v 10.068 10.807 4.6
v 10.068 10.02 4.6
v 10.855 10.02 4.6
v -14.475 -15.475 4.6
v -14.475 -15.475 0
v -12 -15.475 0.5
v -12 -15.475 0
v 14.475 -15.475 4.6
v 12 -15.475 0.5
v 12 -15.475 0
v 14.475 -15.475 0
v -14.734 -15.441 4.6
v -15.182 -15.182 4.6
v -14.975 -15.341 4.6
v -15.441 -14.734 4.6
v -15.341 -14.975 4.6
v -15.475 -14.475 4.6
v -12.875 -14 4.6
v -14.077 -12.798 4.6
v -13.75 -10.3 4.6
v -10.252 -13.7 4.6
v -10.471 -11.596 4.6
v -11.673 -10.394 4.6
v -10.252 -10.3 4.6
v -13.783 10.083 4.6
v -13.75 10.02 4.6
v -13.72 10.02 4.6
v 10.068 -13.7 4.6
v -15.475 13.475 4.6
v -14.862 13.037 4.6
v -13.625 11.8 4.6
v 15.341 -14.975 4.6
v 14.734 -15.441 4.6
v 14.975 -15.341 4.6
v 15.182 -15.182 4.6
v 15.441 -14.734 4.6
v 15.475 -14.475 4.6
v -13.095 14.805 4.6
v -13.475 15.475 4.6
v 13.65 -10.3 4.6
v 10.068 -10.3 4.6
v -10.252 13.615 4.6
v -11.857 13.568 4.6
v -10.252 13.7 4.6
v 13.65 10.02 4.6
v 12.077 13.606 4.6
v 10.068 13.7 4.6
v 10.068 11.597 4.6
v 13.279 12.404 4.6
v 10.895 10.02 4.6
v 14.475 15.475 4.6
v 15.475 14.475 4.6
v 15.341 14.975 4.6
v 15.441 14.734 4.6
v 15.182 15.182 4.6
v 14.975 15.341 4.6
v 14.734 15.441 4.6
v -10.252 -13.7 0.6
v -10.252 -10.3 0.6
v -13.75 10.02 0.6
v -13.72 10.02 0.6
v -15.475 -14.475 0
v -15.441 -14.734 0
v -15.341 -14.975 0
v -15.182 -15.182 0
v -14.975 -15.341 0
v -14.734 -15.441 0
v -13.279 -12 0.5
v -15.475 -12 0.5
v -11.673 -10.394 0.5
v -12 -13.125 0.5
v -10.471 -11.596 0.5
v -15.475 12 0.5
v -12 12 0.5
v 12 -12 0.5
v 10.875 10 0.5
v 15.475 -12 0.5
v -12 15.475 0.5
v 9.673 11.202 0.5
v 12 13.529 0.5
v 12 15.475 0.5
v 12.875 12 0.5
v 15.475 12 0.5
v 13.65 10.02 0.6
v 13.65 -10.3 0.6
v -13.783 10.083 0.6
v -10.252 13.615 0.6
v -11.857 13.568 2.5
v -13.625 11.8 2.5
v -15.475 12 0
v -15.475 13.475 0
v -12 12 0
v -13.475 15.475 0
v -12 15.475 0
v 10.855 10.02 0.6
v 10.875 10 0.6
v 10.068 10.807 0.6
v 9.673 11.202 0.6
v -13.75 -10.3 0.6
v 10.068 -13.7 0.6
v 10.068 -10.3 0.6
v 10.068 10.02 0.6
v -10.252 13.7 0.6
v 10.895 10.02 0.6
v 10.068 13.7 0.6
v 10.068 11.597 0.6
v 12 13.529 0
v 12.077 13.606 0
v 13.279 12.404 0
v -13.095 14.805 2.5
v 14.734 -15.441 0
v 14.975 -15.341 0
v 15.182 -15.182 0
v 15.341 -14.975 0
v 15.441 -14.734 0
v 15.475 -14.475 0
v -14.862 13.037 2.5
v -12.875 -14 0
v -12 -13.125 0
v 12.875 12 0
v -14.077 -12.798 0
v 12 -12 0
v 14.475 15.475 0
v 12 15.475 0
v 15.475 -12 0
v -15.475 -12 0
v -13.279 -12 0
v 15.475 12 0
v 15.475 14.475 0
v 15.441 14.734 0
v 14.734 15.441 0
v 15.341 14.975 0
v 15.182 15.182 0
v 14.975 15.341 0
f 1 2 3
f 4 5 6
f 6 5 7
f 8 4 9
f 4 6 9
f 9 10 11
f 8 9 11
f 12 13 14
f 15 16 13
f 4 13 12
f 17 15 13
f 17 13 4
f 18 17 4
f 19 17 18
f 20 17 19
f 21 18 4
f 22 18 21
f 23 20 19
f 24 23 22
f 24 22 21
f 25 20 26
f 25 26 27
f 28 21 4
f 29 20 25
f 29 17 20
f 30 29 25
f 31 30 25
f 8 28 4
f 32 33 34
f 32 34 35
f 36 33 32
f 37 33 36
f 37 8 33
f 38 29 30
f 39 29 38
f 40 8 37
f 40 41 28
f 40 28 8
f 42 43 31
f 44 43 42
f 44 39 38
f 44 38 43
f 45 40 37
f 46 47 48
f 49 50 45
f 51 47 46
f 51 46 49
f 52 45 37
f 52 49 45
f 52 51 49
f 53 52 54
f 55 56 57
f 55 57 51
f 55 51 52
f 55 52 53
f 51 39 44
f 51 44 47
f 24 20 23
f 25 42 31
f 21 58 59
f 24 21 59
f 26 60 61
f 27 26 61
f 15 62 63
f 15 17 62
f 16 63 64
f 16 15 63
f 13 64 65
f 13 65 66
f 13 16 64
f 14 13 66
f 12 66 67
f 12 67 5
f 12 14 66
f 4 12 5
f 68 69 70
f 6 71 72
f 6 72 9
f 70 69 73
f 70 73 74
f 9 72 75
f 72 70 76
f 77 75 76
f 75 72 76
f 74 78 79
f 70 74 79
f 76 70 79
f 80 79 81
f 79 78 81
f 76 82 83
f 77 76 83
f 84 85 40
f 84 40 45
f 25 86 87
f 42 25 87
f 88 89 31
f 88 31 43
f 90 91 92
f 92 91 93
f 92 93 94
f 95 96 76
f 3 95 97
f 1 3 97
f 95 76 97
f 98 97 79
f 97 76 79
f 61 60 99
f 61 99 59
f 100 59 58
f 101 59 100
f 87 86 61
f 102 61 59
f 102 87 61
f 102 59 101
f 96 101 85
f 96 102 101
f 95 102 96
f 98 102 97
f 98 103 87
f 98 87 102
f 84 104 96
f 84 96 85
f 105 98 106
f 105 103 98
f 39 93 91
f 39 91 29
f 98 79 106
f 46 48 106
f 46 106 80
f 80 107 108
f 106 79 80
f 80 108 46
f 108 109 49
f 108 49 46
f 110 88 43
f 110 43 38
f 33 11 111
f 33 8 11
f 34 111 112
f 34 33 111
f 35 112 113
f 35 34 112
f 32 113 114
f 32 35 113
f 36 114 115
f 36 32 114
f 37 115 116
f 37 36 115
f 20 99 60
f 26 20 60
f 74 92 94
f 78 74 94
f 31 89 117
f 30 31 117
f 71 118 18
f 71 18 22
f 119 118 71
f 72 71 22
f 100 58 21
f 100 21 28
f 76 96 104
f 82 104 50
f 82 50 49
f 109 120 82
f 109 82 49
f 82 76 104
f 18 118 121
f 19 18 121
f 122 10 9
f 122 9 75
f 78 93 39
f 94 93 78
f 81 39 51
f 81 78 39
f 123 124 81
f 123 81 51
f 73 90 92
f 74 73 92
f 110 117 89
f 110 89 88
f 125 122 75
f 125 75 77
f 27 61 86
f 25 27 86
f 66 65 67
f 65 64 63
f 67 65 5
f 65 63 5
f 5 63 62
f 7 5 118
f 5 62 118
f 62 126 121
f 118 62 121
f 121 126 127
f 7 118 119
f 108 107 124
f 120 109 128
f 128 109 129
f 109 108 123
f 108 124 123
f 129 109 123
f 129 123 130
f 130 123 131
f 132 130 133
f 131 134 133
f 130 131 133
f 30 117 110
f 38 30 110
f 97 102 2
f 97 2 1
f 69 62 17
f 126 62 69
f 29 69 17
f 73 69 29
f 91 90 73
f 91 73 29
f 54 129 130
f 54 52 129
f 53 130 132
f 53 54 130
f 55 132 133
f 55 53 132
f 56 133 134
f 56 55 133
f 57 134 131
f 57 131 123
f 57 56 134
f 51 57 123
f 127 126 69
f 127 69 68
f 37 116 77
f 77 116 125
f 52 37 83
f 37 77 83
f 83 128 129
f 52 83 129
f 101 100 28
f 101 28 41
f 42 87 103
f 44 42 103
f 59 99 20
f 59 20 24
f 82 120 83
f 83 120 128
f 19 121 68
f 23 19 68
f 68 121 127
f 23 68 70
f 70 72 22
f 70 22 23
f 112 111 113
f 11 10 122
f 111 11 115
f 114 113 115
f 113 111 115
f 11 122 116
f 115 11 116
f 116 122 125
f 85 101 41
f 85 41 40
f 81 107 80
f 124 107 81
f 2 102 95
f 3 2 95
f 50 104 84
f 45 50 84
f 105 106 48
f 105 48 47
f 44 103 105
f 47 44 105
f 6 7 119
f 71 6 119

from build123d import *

# Parameters (mm, degrees)
BOX_W        = 30.95
BOX_H        = 30.95
BOX_DEPTH    = 4.6
BOX001_W     = 30.975
BOX001_H     = 24
BOX001_DEPTH = 0.5
BOX002_W     = 24
BOX002_H     = 30.975
BOX002_DEPTH = 0.5
BOX003_W     = 20.32
BOX003_H     = 27.4
BOX003_DEPTH = 4
CHAMFER_SIZE = 2
BOX004_W     = 2.5
BOX004_H     = 1.75
BOX004_DEPTH = 3
BOX005_W     = 27.4
BOX005_H     = 20.32
BOX005_DEPTH = 4
BOX006_W     = 5.1
BOX006_H     = 3.3
BOX006_DEPTH = 4
BOX007_W     = 3.4
BOX007_H     = 1.7
BOX007_DEPTH = 4.6
BOX008_W     = 3.4
BOX008_H     = 1.7
BOX008_DEPTH = 4.6
FILLET_R     = 1
FILLET001_R  = 1
FILLET002_R  = 1


with BuildPart() as part:
    # Box → Box (join)
    with BuildSketch(Plane(origin=(-15.475, -15.475, 0), x_dir=(1, 0, 0), z_dir=(0, 0, 1))):
        with Locations((15.475, 15.475)):
            Rectangle(BOX_W, BOX_H)
    extrude(amount=BOX_DEPTH)

    # Box001 → Box001 (cut)
    with BuildSketch(Plane(origin=(-15.475, -12, 0), x_dir=(1, 0, 0), z_dir=(0, 0, 1))):
        with Locations((15.4875, 12)):
            Rectangle(BOX001_W, BOX001_H)
    extrude(amount=BOX001_DEPTH, mode=Mode.SUBTRACT)

    # Box002 → Box002 (cut)
    with BuildSketch(Plane(origin=(-12, -15.475, 0), x_dir=(1, 0, 0), z_dir=(0, 0, 1))):
        with Locations((12, 15.4875)):
            Rectangle(BOX002_W, BOX002_H)
    extrude(amount=BOX002_DEPTH, mode=Mode.SUBTRACT)

    # Box003 → Box003 (cut)
    with BuildSketch(Plane(origin=(-10.252, -13.7, 0.6), x_dir=(1, 0, 0), z_dir=(0, 0, 1))):
        with Locations((10.16, 13.7)):
            Rectangle(BOX003_W, BOX003_H)
    extrude(amount=BOX003_DEPTH, mode=Mode.SUBTRACT)

    # Chamfer
    chamfer_edges = [part.edges().sort_by_distance(p)[0] for p in [
        (-15.475, 15.475, 2.3),
    ]]
    chamfer(chamfer_edges, length=CHAMFER_SIZE)

    # Box004 → Box004 (cut)
    with BuildSketch(Plane(origin=(-13.625, 11.8, 2.5), x_dir=(0.707107, 0.707107, 0), z_dir=(0, 0, 1))):
        with Locations((1.25, 0.875)):
            Rectangle(BOX004_W, BOX004_H)
    extrude(amount=BOX004_DEPTH, mode=Mode.SUBTRACT)

    # Box005 → Box005 (cut)
    with BuildSketch(Plane(origin=(-13.75, -10.3, 0.6), x_dir=(1, 0, 0), z_dir=(0, 0, 1))):
        with Locations((13.7, 10.16)):
            Rectangle(BOX005_W, BOX005_H)
    extrude(amount=BOX005_DEPTH, mode=Mode.SUBTRACT)

    # Box006 → Box006 (cut)
    with BuildSketch(Plane(origin=(-11.45, 7.75, 0.6), x_dir=(0.707107, 0.707107, 0), z_dir=(0, 0, 1))):
        with Locations((2.55, 1.65)):
            Rectangle(BOX006_W, BOX006_H)
    extrude(amount=BOX006_DEPTH, mode=Mode.SUBTRACT)

    # Box007 → Box007 (cut)
    with BuildSketch(Plane(origin=(-12.875, -14, 0), x_dir=(0.707107, 0.707107, 0), z_dir=(0, 0, 1))):
        with Locations((1.7, 0.85)):
            Rectangle(BOX007_W, BOX007_H)
    extrude(amount=BOX007_DEPTH, mode=Mode.SUBTRACT)

    # Box008 → Box008 (cut)
    with BuildSketch(Plane(origin=(10.875, 10, 0), x_dir=(0.707107, 0.707107, 0), z_dir=(0, 0, 1))):
        with Locations((1.7, 0.85)):
            Rectangle(BOX008_W, BOX008_H)
    extrude(amount=BOX008_DEPTH, mode=Mode.SUBTRACT)

    # Fillet
    fillet_edges = [part.edges().sort_by_distance(p)[0] for p in [
        (-15.475, -15.475, 2.3),
    ]]
    fillet(fillet_edges, radius=FILLET_R)

    # Fillet001
    fillet001_edges = [part.edges().sort_by_distance(p)[0] for p in [
        (15.475, -15.475, 2.3),
    ]]
    fillet(fillet001_edges, radius=FILLET001_R)

    # Fillet002
    fillet002_edges = [part.edges().sort_by_distance(p)[0] for p in [
        (15.475, 15.475, 2.3),
    ]]
    fillet(fillet002_edges, radius=FILLET002_R)


solid = part.part
